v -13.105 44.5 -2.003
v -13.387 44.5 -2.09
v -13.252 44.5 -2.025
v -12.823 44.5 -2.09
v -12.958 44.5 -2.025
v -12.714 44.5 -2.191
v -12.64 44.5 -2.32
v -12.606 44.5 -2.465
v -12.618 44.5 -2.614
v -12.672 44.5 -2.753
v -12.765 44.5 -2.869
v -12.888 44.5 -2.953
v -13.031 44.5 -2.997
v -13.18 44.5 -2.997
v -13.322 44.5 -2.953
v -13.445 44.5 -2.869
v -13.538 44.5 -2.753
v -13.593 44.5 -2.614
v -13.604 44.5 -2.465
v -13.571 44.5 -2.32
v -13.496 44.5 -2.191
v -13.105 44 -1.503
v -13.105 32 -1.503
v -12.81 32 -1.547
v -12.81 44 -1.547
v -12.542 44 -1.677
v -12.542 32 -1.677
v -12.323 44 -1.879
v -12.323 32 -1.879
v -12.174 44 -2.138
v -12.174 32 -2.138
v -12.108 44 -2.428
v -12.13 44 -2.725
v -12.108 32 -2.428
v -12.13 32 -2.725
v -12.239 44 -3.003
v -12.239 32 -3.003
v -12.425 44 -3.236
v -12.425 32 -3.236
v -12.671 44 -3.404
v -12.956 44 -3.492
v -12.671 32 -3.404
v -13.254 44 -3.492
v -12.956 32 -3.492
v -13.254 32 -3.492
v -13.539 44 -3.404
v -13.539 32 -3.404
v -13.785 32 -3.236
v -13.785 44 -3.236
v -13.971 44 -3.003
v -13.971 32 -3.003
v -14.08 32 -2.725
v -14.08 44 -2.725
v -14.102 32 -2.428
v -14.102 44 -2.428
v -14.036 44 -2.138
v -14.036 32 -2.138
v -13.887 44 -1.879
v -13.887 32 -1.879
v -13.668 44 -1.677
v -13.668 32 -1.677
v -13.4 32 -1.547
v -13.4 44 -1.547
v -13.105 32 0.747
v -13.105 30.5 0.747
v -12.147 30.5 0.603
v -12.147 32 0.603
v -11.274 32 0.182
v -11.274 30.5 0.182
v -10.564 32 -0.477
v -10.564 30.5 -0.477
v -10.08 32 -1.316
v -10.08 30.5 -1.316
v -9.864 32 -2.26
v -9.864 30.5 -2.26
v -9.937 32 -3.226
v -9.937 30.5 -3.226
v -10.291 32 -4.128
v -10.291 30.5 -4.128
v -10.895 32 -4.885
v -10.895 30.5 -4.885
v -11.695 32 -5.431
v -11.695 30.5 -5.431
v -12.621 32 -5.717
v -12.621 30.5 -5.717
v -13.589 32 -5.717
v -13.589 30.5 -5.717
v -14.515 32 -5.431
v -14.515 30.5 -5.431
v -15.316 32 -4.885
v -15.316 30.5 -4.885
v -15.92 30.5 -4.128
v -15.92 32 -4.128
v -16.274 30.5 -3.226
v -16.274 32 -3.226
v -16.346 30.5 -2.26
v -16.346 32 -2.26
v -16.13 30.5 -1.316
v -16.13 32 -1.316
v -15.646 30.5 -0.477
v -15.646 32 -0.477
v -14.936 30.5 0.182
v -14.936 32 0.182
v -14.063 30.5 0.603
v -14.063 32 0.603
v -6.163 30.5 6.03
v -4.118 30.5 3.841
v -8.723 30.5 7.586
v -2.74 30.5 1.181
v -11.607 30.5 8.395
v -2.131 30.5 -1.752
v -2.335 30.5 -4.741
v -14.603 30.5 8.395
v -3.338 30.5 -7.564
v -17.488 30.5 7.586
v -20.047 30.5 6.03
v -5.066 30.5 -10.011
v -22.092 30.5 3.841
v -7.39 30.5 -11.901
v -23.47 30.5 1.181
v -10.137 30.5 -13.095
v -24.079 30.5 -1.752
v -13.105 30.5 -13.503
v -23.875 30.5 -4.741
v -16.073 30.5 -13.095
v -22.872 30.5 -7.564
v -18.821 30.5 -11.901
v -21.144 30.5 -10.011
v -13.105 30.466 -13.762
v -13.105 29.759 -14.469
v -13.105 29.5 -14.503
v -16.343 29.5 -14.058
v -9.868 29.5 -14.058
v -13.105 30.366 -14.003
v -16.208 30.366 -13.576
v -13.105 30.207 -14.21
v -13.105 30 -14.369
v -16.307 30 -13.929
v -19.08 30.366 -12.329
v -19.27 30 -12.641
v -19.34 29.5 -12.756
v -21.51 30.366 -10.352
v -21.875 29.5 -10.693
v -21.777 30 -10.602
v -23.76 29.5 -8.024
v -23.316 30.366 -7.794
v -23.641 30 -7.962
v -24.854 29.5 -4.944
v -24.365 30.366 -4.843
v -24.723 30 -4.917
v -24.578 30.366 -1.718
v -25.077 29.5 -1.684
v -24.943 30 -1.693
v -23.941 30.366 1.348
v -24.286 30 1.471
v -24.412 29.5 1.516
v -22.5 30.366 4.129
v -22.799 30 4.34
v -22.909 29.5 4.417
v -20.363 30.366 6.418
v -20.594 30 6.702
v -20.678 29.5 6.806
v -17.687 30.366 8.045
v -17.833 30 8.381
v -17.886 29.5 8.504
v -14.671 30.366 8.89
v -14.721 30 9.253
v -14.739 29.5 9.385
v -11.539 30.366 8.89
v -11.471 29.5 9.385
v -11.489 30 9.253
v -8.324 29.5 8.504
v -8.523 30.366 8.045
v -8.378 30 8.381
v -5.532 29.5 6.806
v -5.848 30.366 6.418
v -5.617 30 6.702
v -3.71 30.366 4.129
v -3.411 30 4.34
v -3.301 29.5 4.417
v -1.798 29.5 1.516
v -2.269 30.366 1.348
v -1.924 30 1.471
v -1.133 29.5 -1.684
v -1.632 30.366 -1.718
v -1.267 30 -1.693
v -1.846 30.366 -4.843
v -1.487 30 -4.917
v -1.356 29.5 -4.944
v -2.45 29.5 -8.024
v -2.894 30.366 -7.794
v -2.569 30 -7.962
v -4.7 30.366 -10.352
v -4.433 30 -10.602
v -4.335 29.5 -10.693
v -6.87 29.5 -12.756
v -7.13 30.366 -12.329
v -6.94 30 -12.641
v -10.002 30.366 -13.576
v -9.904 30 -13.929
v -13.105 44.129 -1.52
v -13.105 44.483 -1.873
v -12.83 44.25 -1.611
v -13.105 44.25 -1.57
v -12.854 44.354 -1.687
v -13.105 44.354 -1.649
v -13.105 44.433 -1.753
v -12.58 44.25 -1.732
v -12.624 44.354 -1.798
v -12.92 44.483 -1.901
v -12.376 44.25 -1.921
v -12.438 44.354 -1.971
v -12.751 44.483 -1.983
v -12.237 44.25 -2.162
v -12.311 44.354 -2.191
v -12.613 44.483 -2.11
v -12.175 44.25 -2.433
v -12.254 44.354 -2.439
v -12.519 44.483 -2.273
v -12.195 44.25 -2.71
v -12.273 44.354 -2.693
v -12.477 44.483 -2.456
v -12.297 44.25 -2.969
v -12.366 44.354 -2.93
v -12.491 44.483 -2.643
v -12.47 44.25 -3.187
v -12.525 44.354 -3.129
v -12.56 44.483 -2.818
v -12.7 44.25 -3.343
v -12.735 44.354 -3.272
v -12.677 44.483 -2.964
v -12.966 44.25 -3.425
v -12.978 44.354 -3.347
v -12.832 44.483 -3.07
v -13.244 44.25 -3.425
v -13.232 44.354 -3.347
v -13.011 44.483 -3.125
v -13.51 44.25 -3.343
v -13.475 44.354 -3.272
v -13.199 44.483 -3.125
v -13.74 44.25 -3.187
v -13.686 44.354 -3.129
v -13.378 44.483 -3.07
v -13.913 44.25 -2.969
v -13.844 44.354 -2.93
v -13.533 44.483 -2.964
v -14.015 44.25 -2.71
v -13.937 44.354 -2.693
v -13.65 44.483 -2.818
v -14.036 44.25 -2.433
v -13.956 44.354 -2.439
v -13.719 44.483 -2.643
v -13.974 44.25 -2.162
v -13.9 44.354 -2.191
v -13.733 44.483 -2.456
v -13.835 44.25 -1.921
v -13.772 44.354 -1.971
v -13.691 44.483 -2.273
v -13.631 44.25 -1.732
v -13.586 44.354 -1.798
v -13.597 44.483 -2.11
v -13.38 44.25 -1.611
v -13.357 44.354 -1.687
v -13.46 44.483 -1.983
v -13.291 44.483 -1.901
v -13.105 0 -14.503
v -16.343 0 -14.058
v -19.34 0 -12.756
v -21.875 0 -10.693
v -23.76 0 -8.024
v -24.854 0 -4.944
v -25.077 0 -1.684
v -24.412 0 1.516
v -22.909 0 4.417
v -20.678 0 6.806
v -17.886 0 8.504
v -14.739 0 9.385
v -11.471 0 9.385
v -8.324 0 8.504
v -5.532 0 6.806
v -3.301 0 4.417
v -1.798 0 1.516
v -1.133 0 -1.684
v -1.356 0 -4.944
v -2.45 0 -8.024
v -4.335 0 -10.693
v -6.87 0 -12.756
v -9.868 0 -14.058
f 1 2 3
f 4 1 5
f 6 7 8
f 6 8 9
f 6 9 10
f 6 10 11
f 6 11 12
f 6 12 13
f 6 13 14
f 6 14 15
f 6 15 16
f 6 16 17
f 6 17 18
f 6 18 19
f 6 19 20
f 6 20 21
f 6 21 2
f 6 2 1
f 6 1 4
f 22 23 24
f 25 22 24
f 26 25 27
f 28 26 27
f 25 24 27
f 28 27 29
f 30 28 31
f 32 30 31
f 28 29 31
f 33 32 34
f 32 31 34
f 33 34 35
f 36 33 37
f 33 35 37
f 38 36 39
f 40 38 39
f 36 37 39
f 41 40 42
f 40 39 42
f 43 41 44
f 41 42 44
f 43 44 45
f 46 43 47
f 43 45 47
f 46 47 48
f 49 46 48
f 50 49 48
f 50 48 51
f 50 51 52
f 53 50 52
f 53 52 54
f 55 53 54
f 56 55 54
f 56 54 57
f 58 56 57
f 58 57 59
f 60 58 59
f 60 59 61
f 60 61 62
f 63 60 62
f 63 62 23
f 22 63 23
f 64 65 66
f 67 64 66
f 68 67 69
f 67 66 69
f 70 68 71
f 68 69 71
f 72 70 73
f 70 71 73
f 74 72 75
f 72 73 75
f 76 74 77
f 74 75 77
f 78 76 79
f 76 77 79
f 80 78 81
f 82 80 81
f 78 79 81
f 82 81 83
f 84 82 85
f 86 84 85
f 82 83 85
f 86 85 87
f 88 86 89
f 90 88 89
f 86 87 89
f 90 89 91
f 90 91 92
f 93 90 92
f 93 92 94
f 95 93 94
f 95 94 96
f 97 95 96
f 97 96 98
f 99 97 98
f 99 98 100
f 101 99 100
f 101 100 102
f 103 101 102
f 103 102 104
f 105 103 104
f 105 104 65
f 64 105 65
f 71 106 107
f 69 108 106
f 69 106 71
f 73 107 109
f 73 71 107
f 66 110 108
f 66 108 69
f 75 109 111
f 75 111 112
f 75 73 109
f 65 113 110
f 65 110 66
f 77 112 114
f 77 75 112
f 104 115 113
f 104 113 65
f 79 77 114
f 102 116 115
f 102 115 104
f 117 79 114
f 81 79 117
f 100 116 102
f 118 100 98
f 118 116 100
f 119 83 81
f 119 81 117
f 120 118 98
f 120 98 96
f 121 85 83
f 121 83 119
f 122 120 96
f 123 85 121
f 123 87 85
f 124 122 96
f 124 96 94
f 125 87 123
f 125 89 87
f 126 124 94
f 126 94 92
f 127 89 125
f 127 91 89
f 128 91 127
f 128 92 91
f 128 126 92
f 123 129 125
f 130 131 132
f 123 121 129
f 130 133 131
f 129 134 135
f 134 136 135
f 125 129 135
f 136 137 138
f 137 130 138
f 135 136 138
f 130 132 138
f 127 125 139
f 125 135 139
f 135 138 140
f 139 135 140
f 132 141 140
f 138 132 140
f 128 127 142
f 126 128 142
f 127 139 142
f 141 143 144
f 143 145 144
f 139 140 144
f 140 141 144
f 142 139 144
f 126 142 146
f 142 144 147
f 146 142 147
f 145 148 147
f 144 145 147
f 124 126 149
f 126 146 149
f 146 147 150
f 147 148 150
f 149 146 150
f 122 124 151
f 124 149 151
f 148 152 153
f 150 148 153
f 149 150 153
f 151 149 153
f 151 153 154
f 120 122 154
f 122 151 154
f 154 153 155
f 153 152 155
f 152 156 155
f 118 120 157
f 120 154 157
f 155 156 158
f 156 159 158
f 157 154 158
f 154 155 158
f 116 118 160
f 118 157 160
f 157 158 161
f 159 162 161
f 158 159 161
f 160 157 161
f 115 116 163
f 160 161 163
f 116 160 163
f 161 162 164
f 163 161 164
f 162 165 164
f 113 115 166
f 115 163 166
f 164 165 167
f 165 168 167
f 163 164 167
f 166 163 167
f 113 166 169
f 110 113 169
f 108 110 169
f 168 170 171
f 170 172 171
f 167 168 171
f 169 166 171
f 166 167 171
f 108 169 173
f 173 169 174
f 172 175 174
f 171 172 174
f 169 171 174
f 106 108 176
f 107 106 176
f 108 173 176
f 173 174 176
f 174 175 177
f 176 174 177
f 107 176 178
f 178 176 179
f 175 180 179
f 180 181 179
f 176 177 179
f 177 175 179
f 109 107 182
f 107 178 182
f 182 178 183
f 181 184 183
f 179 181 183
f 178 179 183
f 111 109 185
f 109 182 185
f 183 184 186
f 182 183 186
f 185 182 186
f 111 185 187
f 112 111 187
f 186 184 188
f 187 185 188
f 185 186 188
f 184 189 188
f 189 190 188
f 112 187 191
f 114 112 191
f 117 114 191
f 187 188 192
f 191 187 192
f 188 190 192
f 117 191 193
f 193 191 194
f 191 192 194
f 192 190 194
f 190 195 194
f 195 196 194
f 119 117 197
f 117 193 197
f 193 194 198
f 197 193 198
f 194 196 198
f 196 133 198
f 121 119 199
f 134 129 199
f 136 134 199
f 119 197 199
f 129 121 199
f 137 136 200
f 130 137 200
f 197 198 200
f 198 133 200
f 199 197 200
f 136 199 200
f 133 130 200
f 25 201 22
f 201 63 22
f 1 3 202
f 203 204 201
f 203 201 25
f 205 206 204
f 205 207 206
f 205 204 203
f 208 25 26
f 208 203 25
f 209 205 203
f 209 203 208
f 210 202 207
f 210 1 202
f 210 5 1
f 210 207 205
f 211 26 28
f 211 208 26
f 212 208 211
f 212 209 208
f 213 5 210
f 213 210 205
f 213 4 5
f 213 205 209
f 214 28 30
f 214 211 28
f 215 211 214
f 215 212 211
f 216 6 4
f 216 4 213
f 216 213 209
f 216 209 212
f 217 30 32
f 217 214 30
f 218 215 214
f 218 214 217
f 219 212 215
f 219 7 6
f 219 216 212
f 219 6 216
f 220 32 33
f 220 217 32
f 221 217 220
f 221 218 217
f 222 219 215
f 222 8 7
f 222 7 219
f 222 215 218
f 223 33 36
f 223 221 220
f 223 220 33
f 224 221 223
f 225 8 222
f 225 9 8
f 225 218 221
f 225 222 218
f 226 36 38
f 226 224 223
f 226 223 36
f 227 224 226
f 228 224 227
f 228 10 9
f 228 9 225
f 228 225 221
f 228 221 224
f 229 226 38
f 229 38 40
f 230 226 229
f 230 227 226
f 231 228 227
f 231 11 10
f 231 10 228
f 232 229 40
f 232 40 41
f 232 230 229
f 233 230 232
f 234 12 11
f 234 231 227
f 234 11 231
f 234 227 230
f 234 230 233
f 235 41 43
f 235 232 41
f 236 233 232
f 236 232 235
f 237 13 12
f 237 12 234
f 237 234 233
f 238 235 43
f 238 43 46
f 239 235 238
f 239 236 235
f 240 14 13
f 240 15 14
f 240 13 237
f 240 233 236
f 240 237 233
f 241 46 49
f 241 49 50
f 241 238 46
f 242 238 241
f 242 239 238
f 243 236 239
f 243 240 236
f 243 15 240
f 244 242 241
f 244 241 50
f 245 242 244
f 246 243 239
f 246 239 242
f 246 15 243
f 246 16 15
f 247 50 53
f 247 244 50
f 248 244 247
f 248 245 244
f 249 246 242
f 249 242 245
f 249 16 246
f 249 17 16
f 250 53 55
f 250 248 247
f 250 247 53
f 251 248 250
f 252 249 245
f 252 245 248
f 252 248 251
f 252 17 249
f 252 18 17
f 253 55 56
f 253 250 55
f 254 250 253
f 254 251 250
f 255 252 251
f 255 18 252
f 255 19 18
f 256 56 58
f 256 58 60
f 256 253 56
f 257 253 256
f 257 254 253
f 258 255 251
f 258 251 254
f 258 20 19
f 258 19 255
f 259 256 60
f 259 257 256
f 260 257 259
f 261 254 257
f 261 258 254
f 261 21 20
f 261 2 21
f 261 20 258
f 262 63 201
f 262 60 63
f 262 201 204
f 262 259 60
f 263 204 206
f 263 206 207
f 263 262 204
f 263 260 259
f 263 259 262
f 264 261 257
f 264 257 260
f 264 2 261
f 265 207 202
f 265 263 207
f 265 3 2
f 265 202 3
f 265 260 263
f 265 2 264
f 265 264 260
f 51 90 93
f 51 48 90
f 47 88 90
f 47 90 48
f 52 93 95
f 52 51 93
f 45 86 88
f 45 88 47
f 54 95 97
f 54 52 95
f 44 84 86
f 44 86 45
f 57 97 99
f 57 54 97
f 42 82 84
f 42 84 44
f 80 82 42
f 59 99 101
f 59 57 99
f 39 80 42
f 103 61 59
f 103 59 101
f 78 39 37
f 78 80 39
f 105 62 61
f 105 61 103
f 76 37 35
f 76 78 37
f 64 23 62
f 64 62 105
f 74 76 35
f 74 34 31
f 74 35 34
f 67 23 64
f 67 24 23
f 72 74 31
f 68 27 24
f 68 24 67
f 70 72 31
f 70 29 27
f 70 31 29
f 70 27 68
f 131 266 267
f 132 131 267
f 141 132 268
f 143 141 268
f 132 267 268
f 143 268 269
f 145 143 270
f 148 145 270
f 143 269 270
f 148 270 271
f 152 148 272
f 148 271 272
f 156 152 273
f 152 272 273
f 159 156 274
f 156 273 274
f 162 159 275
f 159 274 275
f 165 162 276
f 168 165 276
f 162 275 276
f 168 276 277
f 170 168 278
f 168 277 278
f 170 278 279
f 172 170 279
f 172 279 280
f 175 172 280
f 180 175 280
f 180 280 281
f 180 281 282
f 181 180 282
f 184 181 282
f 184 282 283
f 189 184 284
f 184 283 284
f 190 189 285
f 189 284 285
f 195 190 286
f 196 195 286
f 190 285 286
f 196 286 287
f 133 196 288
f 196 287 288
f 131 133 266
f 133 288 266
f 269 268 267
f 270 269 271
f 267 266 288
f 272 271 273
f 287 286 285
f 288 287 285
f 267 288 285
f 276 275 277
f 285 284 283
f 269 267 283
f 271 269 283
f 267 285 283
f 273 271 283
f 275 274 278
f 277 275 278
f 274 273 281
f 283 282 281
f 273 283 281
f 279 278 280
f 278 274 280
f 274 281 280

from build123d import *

# Parameters (mm, degrees)
SKETCH1_R           = 12
BOSS_EXTRUDE1_DEPTH = 30.5
SKETCH1_3_R         = 3.25
SKETCH1_3_R_2       = 1
BOSS_EXTRUDE2_DEPTH = 32
SKETCH1_4_R         = 1
BOSS_EXTRUDE3_DEPTH = 44.5
FILLET1_R           = 0.5
FILLET2_R           = 1


with BuildPart() as part:
    # Sketch1 → Boss-Extrude1 (new body)
    with BuildSketch(Plane(origin=(0, 0, 0), x_dir=(1, 0, 0), z_dir=(0, 1, 0))):
        with Locations((-13.105100699, 2.502858666)):
            Circle(SKETCH1_R)
    extrude(amount=BOSS_EXTRUDE1_DEPTH)

    # Sketch1<3> → Boss-Extrude2 (add)
    with BuildSketch(Plane(origin=(0, 0, 0), x_dir=(1, 0, 0), z_dir=(0, 1, 0))):
        with Locations((-13.105100699, 2.502858666)):
            Circle(SKETCH1_3_R)
        with Locations((-13.105100699, 2.502858666)):
            Circle(SKETCH1_3_R_2, mode=Mode.SUBTRACT)
    extrude(amount=BOSS_EXTRUDE2_DEPTH)

    # Sketch1<4> → Boss-Extrude3 (add)
    with BuildSketch(Plane(origin=(0, 0, 0), x_dir=(1, 0, 0), z_dir=(0, 1, 0))):
        with Locations((-13.105100699, 2.502858666)):
            Circle(SKETCH1_4_R)
    extrude(amount=BOSS_EXTRUDE3_DEPTH)

    # Fillet1
    fillet1_edges = [part.edges().sort_by_distance(p)[0] for p in [
        (-14.105100699, 44.5, -2.502858666),
    ]]
    fillet(fillet1_edges, radius=FILLET1_R)

    # Fillet2
    fillet2_edges = [part.edges().sort_by_distance(p)[0] for p in [
        (-25.105100699, 30.5, -2.502858666),
    ]]
    fillet(fillet2_edges, radius=FILLET2_R)


solid = part.part
